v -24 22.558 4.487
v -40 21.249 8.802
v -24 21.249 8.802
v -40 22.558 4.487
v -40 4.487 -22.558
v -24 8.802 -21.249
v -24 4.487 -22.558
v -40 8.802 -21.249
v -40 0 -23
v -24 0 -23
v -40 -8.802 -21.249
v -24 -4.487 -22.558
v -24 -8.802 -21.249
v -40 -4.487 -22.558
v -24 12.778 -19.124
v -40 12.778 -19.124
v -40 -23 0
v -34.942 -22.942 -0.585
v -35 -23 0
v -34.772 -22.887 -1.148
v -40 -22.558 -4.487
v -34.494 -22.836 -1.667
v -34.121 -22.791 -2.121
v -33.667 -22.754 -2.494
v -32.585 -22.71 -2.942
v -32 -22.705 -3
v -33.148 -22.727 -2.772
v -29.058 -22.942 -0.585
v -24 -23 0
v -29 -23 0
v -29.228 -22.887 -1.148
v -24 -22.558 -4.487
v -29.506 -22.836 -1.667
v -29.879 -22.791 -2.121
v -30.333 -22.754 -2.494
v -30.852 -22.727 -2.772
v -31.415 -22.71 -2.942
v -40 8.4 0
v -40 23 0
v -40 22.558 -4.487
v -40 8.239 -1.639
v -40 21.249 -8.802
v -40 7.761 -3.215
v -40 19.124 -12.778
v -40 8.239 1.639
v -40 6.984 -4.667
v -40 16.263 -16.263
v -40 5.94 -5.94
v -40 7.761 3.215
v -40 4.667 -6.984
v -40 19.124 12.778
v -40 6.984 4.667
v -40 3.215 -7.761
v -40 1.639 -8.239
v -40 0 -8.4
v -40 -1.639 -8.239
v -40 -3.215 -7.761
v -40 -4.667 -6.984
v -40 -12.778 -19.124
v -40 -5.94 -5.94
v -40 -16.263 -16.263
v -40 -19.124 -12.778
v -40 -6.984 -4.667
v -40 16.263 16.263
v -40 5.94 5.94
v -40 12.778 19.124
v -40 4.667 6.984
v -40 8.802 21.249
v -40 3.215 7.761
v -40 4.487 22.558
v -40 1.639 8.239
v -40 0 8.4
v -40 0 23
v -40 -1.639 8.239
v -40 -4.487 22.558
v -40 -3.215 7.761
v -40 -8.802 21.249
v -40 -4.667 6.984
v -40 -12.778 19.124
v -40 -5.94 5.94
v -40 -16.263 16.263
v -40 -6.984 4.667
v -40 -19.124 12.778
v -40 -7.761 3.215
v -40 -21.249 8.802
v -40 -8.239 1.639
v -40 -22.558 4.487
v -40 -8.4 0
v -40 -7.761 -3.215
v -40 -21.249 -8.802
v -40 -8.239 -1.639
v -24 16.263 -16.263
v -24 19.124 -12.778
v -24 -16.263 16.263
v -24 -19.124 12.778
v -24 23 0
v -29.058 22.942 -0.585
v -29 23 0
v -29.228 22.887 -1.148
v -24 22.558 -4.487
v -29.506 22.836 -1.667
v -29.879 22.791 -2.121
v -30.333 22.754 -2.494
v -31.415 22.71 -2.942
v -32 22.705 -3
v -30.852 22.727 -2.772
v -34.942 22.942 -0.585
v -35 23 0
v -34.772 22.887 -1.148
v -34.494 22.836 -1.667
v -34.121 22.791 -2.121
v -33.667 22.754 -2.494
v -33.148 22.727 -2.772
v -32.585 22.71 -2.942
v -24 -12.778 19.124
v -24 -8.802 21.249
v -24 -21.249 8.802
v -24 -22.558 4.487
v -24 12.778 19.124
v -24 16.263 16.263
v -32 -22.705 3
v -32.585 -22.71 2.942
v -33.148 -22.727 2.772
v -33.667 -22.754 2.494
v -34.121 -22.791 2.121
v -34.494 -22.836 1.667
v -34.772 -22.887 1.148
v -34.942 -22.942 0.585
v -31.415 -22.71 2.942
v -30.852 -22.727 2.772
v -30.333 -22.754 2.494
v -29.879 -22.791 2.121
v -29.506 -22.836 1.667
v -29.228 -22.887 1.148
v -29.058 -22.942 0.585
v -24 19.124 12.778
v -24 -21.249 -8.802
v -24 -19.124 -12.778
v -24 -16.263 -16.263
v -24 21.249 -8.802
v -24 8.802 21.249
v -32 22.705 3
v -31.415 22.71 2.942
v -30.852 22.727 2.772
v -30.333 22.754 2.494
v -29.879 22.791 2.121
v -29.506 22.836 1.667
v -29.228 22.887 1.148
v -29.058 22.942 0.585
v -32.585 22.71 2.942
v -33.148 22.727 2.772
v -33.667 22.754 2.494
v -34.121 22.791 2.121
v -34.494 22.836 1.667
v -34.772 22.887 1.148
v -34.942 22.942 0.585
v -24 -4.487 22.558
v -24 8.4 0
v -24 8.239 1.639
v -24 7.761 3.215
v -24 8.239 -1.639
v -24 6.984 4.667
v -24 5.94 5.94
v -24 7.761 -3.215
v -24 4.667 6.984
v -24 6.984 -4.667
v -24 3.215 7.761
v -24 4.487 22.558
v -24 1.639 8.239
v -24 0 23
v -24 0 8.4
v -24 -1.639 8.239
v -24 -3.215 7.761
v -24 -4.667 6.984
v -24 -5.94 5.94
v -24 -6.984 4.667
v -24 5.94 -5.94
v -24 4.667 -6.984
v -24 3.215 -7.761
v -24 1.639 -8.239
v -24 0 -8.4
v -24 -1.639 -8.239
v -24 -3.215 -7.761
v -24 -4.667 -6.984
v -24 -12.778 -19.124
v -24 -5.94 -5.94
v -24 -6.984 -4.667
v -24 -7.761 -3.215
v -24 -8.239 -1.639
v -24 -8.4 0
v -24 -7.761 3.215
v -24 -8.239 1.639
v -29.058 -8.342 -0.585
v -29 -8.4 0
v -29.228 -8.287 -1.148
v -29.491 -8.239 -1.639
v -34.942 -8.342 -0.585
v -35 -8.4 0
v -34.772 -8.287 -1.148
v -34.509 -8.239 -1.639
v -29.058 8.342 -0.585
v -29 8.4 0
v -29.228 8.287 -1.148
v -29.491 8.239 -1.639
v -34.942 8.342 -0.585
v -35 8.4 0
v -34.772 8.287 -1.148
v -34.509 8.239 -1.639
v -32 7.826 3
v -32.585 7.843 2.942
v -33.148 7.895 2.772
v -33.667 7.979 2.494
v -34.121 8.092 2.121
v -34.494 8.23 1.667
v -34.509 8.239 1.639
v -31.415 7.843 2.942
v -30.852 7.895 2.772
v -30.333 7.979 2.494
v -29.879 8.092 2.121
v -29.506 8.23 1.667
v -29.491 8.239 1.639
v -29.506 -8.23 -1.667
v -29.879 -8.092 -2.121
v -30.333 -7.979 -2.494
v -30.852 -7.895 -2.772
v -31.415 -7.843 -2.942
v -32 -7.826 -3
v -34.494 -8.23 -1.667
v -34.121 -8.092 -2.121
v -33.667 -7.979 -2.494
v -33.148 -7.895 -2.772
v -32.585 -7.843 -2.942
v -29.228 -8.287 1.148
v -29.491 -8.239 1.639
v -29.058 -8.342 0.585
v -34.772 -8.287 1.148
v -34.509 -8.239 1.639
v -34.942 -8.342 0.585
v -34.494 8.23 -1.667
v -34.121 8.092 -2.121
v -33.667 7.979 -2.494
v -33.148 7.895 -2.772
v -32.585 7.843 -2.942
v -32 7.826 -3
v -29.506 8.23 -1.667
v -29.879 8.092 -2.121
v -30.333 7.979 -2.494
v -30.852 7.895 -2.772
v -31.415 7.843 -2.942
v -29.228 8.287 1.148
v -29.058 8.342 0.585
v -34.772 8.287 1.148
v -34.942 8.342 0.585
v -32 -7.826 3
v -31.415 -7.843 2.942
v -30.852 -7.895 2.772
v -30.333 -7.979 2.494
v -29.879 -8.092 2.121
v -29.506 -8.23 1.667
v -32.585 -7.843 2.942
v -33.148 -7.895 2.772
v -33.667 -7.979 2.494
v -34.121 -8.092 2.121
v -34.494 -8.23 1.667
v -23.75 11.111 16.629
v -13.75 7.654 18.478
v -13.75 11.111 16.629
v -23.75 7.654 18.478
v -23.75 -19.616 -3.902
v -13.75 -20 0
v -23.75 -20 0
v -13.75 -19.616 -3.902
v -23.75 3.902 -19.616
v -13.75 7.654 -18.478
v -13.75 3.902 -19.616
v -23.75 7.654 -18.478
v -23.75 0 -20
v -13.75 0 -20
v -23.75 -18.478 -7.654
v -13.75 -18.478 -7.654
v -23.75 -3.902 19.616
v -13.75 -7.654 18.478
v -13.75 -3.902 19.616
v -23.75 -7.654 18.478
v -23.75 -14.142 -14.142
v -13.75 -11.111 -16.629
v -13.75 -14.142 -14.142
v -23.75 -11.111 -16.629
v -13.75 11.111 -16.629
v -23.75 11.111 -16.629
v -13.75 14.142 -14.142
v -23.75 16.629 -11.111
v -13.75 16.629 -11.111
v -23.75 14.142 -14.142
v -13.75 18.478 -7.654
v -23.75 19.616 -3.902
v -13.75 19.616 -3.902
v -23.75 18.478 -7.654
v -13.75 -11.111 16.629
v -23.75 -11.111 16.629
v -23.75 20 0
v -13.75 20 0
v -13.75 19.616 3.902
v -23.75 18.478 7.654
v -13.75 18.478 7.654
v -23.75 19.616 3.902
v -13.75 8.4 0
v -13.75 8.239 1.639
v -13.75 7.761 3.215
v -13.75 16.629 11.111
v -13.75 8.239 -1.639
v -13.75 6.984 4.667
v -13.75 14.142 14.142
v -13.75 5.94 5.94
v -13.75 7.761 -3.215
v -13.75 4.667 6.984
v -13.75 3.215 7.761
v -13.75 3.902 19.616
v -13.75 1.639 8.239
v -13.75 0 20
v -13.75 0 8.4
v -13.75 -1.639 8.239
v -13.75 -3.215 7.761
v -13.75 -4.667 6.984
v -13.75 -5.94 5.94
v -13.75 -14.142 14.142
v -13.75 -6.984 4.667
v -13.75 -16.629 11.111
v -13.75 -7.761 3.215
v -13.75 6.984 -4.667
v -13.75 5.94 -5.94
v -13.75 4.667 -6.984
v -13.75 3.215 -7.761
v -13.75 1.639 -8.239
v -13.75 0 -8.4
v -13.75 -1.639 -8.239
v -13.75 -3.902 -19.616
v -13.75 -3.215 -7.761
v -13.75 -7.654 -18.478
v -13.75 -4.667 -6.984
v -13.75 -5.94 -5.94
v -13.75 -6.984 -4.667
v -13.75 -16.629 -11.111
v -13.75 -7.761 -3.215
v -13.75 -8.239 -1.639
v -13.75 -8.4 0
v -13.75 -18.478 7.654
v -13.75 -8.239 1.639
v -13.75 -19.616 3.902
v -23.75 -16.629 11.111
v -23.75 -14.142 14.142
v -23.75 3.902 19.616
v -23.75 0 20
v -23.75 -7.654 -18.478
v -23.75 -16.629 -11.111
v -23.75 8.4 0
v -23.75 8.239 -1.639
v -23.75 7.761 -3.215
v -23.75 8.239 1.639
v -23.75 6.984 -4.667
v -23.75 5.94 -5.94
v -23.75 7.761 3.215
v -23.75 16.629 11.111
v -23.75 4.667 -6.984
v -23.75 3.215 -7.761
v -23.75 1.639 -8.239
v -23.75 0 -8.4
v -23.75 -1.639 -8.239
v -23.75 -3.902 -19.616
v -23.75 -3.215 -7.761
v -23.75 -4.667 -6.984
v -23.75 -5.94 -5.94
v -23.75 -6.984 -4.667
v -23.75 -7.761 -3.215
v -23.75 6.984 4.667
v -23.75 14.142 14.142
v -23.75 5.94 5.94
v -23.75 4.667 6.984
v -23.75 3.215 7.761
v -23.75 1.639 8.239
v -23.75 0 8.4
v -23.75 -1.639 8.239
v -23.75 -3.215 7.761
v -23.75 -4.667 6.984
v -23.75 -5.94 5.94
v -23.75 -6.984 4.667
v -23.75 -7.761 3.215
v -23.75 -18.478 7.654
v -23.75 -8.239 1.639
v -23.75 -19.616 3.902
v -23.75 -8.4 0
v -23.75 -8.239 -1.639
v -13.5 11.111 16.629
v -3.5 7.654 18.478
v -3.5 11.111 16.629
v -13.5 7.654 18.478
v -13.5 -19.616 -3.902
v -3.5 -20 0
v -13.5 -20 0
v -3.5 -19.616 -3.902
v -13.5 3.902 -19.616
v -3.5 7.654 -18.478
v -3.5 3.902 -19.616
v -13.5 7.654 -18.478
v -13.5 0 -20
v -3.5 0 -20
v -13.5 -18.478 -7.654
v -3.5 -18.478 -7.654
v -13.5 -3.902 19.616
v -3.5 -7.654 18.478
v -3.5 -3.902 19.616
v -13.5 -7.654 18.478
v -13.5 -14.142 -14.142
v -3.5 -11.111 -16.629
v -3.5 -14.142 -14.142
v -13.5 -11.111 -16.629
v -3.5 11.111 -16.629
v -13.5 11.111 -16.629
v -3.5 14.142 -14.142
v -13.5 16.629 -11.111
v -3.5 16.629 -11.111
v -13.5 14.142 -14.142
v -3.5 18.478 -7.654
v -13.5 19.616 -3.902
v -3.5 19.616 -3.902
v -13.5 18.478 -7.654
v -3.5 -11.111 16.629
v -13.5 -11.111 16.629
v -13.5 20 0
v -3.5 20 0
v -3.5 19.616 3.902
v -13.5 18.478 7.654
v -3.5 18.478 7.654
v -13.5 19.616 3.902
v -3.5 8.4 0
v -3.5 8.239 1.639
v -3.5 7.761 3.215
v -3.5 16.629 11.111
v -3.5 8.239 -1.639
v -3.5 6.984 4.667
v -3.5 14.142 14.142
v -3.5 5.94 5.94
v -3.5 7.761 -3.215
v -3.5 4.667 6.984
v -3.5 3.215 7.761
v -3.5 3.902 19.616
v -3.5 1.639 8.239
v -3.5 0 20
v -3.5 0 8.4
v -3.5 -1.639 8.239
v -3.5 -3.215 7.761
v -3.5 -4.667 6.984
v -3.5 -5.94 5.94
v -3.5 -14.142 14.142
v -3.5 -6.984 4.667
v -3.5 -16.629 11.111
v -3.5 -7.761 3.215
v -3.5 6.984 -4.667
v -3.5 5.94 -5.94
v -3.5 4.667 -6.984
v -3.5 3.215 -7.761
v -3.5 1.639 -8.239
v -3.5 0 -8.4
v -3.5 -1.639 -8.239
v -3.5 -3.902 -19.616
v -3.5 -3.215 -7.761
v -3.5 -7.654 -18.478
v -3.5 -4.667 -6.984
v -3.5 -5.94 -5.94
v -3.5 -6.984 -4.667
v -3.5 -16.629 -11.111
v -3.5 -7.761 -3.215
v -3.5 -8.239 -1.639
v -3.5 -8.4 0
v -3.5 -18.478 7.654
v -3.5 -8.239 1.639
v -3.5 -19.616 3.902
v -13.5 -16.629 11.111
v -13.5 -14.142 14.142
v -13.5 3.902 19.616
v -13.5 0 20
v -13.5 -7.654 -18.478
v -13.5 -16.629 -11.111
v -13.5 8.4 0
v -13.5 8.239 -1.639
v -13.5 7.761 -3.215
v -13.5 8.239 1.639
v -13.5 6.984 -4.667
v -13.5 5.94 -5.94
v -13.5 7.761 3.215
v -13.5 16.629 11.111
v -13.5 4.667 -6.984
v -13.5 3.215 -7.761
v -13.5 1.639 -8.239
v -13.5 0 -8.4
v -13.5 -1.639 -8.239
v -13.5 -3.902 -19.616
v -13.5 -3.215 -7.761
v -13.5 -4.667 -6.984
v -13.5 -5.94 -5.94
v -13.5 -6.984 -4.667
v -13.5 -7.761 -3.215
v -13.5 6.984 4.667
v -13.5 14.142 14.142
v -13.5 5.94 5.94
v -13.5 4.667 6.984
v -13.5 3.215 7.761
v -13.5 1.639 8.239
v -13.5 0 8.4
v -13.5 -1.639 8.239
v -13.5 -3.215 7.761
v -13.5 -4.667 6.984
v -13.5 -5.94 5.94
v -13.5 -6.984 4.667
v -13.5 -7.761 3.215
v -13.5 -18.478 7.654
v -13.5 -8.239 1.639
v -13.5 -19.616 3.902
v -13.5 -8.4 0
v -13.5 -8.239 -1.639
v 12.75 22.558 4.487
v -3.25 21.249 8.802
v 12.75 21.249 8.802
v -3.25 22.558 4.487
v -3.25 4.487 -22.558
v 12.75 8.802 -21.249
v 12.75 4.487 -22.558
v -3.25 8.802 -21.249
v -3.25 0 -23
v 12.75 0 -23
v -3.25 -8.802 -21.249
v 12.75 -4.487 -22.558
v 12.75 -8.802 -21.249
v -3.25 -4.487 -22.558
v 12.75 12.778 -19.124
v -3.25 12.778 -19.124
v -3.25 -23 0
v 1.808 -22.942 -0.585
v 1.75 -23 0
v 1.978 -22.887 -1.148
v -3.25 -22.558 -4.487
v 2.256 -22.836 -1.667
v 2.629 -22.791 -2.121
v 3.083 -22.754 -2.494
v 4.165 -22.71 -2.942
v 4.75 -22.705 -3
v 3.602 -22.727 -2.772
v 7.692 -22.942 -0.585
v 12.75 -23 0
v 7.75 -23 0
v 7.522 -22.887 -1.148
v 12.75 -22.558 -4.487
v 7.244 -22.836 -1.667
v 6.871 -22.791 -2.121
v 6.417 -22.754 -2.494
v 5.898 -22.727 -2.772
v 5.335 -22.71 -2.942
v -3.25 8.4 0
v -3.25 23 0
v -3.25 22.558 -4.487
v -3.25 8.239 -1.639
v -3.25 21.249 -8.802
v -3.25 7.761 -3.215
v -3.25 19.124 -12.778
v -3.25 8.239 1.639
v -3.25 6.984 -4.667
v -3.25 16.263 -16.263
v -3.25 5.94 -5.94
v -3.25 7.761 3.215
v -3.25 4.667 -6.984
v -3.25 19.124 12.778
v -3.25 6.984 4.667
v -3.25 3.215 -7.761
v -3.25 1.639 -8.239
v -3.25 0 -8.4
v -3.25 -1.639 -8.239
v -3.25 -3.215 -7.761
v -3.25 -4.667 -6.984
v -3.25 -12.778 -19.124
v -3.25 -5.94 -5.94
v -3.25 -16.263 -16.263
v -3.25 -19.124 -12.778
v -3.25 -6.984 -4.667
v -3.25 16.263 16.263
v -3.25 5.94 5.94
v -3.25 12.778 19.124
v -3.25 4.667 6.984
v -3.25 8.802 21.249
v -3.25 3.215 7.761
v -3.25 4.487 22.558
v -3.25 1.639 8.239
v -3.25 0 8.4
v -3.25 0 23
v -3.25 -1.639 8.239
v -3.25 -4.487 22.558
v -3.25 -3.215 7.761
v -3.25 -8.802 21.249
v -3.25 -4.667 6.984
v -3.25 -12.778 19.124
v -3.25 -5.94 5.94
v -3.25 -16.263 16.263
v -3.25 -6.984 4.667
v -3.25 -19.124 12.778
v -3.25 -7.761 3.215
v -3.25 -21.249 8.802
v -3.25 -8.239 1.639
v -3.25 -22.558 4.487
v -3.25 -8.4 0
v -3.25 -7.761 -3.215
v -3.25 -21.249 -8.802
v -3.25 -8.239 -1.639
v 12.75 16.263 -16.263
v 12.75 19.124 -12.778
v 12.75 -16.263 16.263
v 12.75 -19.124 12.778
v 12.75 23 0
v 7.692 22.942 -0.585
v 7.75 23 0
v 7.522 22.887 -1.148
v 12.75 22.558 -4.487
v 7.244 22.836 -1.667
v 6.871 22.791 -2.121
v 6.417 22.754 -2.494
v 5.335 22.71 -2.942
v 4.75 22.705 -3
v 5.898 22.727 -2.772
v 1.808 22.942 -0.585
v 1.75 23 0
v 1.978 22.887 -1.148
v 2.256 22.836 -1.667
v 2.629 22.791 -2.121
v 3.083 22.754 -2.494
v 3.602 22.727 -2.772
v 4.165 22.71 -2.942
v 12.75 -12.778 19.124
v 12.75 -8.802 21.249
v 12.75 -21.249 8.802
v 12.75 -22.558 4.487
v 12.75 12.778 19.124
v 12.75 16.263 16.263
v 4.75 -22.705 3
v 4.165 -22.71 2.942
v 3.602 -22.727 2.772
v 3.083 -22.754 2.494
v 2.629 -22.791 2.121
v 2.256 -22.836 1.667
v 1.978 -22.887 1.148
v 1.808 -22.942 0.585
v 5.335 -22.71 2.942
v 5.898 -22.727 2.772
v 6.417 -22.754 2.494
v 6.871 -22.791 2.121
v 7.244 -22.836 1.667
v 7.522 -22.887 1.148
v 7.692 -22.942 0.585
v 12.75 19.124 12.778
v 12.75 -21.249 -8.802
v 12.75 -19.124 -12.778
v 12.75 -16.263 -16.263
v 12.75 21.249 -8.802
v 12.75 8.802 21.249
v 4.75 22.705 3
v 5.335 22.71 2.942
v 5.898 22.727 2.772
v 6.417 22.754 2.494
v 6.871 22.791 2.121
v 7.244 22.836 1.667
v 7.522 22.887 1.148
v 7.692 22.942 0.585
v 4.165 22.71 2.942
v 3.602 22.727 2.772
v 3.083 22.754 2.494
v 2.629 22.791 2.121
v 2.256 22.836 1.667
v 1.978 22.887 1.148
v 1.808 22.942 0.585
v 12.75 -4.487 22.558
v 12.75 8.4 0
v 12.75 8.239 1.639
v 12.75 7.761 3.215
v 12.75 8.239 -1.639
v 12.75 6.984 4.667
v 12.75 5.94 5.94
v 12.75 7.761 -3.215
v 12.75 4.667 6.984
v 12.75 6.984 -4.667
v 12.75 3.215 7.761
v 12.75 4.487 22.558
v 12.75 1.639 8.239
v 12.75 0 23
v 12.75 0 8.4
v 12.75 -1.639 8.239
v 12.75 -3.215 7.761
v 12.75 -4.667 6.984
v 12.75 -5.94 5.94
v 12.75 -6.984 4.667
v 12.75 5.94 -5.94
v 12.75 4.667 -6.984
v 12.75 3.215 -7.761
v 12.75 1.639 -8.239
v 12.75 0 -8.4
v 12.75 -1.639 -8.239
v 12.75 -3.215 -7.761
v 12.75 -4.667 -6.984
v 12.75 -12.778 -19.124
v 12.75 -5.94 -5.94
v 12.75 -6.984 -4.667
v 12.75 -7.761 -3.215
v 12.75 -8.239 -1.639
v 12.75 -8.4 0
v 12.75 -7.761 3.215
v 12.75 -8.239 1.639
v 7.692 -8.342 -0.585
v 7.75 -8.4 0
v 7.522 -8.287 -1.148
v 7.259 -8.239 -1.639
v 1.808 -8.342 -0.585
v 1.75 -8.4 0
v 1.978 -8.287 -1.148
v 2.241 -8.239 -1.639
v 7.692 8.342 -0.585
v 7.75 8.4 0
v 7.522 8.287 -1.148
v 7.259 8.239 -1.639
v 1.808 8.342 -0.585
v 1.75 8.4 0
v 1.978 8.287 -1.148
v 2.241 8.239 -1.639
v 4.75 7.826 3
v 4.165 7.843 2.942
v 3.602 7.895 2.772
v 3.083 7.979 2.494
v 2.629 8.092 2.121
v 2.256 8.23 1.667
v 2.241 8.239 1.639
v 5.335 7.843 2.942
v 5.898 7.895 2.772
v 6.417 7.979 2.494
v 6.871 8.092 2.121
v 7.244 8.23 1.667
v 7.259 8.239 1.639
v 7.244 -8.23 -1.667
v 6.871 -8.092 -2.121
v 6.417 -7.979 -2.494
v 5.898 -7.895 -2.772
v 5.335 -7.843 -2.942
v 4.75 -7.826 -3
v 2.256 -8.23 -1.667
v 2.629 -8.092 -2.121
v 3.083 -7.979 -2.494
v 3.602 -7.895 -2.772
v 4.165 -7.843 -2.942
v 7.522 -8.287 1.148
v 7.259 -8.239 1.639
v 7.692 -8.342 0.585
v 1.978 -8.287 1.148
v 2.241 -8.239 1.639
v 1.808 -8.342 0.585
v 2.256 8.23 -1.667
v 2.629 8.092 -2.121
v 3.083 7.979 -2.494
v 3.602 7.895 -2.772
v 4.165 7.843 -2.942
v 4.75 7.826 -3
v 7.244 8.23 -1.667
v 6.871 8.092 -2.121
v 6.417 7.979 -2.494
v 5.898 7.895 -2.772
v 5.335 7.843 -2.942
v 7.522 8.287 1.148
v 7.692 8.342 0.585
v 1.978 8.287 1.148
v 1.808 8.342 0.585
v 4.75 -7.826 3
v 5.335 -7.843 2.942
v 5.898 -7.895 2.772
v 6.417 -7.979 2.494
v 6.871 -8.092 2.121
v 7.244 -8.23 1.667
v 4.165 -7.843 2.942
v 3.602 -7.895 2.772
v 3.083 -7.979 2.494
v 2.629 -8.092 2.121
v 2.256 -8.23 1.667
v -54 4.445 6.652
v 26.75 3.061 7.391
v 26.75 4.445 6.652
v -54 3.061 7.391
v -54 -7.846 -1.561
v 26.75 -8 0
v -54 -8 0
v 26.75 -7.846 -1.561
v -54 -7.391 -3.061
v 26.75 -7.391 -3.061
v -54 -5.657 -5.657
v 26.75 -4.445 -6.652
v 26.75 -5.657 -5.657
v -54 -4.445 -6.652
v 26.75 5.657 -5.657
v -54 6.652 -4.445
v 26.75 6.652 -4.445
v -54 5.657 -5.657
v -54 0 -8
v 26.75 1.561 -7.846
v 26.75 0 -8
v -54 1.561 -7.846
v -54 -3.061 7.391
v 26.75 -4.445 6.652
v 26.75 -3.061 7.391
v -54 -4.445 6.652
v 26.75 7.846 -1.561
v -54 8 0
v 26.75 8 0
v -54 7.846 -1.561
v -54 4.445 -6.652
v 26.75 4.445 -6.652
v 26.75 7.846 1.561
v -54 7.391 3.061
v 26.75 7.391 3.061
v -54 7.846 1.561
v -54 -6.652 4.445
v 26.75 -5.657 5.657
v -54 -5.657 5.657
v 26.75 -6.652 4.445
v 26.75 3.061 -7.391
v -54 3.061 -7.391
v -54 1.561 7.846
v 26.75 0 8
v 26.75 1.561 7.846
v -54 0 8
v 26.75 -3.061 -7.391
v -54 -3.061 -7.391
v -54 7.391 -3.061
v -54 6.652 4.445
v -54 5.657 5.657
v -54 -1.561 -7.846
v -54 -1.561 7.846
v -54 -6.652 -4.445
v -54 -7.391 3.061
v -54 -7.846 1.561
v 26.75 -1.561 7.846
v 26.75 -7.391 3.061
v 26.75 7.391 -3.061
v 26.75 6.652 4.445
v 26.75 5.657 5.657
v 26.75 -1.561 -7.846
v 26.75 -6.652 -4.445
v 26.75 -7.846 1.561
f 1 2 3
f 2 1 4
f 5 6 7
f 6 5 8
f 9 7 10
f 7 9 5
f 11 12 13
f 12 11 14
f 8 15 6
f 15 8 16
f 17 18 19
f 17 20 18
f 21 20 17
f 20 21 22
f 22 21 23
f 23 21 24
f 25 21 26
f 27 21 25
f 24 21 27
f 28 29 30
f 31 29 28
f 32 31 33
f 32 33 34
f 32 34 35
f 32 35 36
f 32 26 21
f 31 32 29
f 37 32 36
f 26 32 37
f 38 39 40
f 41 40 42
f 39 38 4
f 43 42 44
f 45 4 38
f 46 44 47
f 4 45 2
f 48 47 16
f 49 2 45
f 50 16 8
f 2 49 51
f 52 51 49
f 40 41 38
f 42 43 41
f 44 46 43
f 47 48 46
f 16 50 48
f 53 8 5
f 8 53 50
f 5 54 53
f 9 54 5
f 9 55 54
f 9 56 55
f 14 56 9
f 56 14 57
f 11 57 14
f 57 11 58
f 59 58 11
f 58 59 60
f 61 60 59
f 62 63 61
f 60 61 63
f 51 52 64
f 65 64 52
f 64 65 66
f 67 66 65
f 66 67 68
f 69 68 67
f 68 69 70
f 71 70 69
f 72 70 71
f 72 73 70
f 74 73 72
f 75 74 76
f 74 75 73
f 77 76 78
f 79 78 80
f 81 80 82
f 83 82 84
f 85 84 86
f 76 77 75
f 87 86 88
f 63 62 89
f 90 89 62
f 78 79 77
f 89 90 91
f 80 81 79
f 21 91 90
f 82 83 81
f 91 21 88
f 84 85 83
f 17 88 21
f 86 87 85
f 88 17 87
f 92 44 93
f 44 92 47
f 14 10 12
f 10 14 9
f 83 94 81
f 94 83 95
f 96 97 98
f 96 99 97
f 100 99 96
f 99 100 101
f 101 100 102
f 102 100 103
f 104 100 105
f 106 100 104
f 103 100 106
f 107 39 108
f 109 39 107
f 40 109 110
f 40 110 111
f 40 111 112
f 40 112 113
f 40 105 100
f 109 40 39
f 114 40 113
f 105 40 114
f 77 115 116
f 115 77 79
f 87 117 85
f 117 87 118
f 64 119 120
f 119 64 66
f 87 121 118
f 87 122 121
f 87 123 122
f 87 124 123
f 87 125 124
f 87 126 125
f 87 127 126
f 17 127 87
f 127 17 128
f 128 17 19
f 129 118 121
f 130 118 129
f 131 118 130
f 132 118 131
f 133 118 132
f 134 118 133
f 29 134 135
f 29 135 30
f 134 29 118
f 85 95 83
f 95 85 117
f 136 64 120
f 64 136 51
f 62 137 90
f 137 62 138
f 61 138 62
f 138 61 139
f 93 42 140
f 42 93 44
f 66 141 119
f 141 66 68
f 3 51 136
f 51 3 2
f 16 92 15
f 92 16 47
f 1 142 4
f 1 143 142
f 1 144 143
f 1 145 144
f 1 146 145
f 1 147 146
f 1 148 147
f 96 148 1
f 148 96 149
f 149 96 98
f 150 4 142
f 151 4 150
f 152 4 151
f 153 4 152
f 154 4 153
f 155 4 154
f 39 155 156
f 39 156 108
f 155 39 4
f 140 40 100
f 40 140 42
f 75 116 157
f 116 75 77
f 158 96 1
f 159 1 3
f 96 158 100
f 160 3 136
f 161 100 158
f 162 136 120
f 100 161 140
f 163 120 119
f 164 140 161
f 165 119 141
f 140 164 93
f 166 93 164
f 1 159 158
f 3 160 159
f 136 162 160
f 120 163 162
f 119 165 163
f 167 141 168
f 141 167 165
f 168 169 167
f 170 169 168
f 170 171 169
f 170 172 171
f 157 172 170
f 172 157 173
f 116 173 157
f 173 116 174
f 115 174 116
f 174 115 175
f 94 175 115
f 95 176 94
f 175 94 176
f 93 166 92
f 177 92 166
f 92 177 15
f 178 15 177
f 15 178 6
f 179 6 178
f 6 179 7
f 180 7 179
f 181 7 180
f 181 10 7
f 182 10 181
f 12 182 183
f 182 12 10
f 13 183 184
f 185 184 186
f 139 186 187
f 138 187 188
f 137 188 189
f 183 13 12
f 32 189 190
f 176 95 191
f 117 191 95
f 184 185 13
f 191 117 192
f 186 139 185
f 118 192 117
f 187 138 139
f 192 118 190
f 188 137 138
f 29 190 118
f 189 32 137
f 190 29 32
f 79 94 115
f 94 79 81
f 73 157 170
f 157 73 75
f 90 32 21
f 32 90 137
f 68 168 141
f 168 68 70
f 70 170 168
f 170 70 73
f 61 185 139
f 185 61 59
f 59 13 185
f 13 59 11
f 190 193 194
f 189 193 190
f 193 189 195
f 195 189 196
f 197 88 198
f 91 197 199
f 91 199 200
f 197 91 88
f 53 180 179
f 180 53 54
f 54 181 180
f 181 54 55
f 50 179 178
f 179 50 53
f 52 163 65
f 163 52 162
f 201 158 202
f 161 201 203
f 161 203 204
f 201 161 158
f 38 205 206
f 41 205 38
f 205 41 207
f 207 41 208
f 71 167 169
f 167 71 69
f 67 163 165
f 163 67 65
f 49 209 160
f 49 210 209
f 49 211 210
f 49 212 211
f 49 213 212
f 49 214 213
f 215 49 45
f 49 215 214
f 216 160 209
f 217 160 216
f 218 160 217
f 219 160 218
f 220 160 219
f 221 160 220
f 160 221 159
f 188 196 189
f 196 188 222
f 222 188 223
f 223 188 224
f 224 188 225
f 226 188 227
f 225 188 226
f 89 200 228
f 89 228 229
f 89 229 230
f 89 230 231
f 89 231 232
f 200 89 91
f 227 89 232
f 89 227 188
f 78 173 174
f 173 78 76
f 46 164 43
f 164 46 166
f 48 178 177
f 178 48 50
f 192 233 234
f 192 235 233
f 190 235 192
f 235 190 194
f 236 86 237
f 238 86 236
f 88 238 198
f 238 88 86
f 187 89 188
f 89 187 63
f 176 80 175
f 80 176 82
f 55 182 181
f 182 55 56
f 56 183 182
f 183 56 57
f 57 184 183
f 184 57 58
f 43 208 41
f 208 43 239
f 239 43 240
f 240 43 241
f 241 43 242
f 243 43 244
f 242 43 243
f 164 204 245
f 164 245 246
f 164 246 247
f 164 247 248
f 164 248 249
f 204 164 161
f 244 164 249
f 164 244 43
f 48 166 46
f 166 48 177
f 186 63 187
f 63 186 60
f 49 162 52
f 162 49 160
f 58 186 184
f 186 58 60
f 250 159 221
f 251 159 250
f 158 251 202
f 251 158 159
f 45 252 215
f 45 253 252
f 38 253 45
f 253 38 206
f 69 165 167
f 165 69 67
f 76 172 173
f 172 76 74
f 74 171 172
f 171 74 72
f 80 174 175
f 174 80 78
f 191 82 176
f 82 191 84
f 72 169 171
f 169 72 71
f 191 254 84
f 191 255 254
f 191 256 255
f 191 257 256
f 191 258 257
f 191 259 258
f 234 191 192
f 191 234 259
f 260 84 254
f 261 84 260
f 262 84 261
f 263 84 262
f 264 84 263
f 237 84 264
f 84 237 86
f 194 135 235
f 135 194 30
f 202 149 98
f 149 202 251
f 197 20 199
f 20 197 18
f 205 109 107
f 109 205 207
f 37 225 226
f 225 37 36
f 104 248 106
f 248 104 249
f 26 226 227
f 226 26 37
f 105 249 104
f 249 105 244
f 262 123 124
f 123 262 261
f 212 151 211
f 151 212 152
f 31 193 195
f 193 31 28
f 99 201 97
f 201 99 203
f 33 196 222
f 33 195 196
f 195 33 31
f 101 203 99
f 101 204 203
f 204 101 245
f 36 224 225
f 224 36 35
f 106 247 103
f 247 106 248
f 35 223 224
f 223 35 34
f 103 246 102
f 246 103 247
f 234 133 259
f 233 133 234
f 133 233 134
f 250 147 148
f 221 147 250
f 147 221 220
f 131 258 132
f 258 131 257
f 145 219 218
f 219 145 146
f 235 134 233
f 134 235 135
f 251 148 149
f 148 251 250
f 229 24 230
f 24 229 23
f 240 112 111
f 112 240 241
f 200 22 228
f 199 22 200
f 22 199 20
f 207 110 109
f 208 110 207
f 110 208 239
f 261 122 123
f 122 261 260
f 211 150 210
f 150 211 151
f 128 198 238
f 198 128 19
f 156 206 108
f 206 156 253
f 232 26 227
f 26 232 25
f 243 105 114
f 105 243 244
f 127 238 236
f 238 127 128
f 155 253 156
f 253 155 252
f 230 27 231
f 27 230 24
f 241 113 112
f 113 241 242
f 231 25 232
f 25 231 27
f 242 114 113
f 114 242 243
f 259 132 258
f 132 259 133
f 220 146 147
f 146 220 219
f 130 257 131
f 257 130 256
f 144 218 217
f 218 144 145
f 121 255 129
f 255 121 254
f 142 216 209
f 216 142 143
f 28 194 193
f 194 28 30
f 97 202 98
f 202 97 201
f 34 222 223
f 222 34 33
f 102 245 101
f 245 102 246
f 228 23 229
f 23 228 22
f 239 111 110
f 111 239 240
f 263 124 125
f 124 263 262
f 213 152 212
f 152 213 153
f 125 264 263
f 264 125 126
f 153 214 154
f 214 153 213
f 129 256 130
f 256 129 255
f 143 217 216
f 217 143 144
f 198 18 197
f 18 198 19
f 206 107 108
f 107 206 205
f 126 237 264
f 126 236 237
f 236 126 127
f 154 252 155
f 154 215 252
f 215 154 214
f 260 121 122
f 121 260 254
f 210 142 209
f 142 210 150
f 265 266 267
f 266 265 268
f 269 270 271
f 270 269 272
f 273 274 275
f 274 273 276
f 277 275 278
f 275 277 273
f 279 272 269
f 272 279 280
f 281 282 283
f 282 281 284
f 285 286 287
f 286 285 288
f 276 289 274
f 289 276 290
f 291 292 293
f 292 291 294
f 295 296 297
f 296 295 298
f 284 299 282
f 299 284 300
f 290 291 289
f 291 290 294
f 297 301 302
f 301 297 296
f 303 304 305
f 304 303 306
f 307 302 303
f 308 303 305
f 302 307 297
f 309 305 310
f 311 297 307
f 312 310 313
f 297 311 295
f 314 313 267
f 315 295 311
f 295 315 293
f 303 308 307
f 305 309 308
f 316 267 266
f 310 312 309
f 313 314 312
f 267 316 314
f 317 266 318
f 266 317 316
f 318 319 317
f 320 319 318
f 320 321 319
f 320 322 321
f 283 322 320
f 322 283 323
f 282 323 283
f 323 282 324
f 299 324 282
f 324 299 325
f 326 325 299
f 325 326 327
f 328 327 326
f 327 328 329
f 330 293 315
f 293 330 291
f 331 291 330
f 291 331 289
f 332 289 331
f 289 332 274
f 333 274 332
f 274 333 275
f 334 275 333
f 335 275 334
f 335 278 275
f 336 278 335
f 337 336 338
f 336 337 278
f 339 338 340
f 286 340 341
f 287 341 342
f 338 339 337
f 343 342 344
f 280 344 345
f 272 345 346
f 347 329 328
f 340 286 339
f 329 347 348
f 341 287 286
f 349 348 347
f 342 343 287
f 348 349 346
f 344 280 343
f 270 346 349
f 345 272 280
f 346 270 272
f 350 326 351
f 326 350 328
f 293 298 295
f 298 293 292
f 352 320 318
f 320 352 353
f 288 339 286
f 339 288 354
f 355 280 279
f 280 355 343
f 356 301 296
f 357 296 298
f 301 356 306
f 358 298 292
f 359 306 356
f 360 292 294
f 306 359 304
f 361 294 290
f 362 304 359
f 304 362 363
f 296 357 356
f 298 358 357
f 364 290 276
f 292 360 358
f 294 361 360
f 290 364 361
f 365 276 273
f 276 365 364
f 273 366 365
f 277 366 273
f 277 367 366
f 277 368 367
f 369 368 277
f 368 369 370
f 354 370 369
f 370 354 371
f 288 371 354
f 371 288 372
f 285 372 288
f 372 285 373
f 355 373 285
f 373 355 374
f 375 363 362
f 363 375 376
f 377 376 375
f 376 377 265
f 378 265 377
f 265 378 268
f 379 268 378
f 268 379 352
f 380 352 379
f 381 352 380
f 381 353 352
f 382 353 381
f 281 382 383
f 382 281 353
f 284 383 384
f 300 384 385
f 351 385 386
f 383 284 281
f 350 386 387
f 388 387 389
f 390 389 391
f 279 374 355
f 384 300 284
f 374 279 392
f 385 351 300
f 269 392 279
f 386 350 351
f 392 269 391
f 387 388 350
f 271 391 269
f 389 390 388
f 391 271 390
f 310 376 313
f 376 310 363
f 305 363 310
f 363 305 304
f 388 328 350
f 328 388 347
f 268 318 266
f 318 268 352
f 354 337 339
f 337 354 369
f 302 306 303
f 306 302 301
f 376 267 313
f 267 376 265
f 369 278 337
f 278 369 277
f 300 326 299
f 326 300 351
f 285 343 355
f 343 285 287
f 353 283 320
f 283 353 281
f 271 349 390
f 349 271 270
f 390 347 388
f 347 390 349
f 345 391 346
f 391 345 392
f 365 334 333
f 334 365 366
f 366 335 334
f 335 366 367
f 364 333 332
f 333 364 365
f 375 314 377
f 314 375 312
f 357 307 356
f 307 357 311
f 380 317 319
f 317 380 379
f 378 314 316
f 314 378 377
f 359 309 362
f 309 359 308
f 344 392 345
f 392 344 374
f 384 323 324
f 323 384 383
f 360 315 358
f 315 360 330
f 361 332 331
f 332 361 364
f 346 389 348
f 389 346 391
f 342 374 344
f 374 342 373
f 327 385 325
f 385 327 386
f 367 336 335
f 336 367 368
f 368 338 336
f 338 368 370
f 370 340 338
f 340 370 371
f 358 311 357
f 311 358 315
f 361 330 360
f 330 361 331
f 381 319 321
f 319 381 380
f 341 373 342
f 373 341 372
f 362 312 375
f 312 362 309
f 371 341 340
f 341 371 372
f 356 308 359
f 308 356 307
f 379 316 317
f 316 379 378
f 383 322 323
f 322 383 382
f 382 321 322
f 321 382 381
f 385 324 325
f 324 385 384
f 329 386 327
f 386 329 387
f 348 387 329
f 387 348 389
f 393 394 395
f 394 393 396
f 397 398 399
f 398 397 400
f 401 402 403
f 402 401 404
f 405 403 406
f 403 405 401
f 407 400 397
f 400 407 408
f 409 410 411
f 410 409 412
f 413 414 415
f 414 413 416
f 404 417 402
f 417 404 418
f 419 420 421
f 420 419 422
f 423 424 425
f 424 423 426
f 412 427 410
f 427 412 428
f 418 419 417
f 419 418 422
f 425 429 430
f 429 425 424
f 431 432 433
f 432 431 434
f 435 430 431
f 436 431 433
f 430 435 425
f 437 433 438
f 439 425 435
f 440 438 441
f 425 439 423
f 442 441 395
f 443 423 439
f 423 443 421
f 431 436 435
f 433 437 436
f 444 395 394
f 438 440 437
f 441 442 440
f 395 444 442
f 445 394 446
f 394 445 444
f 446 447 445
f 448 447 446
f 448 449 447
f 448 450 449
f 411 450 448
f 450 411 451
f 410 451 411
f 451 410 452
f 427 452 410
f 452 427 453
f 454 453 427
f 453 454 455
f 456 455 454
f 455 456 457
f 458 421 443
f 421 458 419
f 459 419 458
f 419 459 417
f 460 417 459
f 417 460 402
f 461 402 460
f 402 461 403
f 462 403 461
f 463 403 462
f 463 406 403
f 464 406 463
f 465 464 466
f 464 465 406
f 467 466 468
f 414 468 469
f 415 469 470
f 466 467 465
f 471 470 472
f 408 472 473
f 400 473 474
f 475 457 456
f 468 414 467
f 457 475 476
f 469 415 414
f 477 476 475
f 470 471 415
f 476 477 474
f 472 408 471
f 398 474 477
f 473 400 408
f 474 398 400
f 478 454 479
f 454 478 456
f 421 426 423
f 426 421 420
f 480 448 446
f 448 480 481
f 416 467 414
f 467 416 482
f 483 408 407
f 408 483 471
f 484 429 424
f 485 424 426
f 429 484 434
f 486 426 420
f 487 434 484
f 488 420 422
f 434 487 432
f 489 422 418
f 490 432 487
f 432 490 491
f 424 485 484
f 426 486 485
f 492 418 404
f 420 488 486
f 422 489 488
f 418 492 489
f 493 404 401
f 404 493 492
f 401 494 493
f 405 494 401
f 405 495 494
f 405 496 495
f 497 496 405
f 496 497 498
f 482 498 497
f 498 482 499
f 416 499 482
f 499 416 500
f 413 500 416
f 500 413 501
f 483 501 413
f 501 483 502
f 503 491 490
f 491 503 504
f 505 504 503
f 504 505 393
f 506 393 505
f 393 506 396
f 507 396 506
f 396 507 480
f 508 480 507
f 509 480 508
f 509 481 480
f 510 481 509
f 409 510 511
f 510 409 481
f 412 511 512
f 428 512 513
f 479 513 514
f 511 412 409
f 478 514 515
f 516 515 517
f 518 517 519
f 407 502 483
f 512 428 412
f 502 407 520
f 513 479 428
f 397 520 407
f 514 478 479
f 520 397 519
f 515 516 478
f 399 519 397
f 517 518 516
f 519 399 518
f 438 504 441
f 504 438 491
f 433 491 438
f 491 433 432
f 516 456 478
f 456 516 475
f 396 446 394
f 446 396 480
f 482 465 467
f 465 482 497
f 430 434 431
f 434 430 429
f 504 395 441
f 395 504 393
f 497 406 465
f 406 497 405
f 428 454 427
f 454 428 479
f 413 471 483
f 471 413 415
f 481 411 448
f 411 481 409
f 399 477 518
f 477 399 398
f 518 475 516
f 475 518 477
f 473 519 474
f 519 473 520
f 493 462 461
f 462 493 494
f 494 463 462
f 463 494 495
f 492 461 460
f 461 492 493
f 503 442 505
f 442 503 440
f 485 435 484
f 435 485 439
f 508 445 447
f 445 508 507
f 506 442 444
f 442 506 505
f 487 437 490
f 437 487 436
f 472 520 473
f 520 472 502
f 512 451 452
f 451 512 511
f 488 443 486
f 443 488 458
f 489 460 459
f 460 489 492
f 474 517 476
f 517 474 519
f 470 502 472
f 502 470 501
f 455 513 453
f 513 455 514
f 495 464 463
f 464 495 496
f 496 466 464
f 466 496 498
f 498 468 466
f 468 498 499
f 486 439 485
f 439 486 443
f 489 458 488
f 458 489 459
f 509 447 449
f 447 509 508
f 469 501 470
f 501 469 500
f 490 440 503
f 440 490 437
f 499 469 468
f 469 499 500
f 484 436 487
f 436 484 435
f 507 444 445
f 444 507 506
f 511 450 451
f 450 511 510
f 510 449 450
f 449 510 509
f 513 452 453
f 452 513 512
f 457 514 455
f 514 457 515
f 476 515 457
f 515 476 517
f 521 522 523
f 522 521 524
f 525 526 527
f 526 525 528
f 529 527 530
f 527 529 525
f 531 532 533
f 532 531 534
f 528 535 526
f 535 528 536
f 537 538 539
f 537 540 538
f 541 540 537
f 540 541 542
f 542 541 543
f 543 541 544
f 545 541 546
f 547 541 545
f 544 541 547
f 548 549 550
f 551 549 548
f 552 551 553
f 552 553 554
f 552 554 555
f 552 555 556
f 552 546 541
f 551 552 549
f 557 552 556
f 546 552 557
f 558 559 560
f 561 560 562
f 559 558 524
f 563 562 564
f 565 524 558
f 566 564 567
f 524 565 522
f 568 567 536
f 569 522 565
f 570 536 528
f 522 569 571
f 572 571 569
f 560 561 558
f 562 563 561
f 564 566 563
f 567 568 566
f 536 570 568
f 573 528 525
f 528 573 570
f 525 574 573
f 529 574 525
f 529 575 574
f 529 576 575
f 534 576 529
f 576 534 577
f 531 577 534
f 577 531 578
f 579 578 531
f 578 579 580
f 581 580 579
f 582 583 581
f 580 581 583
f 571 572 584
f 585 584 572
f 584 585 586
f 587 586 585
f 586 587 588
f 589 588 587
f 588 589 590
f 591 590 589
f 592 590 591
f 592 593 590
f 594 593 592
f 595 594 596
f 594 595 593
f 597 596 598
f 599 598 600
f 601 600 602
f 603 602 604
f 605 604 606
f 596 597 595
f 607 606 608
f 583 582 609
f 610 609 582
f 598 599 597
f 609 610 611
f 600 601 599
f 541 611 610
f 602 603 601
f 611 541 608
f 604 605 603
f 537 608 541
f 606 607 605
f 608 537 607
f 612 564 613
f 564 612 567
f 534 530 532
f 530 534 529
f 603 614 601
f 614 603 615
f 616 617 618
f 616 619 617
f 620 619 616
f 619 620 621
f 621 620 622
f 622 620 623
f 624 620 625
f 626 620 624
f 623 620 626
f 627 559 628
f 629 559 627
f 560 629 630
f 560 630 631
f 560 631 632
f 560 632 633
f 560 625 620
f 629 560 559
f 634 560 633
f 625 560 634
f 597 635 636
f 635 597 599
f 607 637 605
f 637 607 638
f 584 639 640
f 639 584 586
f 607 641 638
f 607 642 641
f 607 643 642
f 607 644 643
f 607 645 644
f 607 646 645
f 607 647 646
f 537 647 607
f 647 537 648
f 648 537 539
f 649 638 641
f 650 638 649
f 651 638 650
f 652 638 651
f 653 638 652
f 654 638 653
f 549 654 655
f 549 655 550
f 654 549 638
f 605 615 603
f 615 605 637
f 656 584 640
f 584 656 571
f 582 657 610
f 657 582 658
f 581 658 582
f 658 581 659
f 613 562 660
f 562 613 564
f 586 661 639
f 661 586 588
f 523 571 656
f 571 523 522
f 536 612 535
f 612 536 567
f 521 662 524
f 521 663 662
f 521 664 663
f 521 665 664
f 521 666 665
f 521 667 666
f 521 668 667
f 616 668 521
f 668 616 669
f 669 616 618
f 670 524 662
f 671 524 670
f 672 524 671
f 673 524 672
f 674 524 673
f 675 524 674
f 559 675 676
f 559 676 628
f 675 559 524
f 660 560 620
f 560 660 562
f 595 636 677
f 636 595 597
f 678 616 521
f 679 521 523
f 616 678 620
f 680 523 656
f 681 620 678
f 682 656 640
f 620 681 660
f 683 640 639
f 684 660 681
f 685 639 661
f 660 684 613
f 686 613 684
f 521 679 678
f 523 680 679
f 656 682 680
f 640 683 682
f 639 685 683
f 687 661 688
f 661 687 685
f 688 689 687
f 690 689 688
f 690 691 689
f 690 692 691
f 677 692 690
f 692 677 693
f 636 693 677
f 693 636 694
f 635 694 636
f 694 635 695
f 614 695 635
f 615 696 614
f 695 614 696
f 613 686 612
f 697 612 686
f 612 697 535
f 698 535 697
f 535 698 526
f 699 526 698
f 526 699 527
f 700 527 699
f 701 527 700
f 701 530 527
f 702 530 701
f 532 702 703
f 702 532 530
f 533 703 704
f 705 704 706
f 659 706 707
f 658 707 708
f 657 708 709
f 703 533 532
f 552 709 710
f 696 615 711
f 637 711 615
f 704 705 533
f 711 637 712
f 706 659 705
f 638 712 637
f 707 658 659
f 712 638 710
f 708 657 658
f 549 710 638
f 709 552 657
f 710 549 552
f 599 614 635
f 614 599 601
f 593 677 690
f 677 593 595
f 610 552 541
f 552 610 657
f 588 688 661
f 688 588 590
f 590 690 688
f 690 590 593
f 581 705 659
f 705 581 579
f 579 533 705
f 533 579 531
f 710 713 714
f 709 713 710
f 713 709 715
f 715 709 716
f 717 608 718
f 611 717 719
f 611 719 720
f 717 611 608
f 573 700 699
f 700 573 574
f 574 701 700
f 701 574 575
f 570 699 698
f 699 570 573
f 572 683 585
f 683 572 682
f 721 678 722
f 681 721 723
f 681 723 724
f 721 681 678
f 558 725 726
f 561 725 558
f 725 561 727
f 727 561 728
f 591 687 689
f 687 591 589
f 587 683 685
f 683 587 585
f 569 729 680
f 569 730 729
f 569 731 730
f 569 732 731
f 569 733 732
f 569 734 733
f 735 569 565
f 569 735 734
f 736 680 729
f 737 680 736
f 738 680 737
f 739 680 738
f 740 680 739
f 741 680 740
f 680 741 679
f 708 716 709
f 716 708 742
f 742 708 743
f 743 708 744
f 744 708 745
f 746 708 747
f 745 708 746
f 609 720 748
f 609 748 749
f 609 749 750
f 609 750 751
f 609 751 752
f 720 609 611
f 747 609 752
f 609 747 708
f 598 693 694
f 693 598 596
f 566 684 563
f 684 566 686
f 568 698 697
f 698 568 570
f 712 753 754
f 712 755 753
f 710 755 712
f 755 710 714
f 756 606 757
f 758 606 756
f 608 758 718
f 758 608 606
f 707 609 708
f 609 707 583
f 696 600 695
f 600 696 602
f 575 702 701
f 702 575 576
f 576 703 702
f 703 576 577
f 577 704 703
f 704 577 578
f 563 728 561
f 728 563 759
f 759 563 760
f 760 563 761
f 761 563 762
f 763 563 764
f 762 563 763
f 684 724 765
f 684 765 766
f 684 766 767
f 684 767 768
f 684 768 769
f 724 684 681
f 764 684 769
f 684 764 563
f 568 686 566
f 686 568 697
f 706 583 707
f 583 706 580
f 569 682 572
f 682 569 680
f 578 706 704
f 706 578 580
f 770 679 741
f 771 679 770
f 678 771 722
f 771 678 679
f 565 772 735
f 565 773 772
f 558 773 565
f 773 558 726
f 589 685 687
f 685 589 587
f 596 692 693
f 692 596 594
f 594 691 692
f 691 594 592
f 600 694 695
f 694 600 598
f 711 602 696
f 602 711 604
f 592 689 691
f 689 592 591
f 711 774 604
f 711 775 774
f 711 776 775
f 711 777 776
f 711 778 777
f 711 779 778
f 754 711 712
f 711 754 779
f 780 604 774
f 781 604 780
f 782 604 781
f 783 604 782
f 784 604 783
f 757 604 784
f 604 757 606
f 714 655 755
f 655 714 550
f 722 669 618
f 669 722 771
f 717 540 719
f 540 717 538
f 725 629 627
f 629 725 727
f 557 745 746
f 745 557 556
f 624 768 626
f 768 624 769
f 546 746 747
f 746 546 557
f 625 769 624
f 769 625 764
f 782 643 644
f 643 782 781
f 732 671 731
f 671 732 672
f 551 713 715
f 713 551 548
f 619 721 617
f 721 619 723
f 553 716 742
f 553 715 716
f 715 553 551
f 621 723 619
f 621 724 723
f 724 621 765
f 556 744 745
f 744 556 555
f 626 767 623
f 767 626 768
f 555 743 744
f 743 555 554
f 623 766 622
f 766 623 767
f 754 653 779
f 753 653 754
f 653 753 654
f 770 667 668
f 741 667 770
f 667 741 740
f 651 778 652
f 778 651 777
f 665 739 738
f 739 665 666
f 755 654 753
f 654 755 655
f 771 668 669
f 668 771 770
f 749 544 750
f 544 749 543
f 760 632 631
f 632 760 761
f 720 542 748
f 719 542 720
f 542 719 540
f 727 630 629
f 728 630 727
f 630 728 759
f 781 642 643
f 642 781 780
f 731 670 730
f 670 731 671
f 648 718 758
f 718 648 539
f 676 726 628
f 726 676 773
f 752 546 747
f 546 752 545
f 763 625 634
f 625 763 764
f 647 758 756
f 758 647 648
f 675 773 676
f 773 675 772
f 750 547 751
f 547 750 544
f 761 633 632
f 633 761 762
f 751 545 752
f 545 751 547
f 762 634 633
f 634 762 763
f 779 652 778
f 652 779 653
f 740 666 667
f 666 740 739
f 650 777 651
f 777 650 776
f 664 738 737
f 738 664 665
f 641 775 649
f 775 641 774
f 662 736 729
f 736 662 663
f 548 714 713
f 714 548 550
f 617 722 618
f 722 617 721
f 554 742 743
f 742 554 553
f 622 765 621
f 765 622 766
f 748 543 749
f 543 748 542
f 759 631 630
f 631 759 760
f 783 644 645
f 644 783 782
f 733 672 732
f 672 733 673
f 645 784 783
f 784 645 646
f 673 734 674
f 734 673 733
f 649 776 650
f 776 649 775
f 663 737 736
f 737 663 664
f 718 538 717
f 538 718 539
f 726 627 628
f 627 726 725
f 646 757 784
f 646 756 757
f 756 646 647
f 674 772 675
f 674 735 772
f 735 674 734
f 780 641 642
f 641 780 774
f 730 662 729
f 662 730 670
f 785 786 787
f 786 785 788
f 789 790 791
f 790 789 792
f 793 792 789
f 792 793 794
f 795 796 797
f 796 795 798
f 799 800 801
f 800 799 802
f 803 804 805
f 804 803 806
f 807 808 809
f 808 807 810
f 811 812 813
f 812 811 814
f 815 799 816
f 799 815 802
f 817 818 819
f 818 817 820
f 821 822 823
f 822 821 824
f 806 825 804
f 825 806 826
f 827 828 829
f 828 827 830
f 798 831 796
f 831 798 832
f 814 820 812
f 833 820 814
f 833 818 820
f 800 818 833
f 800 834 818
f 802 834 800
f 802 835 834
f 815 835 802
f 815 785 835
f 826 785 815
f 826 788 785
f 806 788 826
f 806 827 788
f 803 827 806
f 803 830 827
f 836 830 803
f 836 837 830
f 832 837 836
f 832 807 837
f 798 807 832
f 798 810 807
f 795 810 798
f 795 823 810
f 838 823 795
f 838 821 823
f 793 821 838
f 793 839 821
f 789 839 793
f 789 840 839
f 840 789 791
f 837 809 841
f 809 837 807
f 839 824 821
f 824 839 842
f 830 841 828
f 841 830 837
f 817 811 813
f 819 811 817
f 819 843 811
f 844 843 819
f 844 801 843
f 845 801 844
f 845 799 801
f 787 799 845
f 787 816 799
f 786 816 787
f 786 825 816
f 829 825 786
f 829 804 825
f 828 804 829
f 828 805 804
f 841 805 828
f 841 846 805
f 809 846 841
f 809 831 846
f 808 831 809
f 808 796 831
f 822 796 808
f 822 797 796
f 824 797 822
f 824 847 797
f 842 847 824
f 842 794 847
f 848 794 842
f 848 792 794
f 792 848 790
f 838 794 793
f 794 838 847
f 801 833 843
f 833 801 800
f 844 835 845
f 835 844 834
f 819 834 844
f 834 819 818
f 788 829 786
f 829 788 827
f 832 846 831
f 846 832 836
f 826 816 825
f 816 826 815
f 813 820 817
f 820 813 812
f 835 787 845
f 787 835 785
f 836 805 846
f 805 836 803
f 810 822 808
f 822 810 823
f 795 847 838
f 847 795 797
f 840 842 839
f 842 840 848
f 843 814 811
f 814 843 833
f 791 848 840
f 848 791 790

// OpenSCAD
$fn = 32;

// ------------------------------------------------------------------------
// Shaft with rings and collars: d16 shaft, 4 rings
// Every part is its own module, assembly() places them once.
// ------------------------------------------------------------------------

// --- part 1 ---
module shaft() {
  translate([0, 0, -40.375]) cylinder(h = 80.75, d = 16);
}

// --- part 2 ---
module collar_a() {
  difference() {
    cylinder(h = 16, d = 46);
    translate([0, 0, -1]) cylinder(h = 18, d = 16.8);
    translate([0, 0, 8]) rotate([90, 0, 0]) cylinder(h = 48, d = 6, center = true);
  }
}

// --- part 3 ---
module spacer_a() {
  difference() {
      translate([0, 0, 0]) cylinder(h = 10, d = 40);
      translate([0, 0, -1]) cylinder(h = 12, d = 16.8);
    }
}

// --- part 4 ---
module spacer_b() {
  difference() {
      translate([0, 0, 0]) cylinder(h = 10, d = 40);
      translate([0, 0, -1]) cylinder(h = 12, d = 16.8);
    }
}

// --- part 5 ---
module collar_b() {
  difference() {
    cylinder(h = 16, d = 46);
    translate([0, 0, -1]) cylinder(h = 18, d = 16.8);
    translate([0, 0, 8]) rotate([90, 0, 0]) cylinder(h = 48, d = 6, center = true);
  }
}

// --- assembly ---
module assembly() {
  translate([-13.625, 0, 0]) rotate([0, 90, 0]) shaft();
  translate([-40, 0, 0]) rotate([0, 90, 0]) collar_a();
  translate([-23.75, 0, 0]) rotate([0, 90, 0]) spacer_a();
  translate([-13.5, 0, 0]) rotate([0, 90, 0]) spacer_b();
  translate([-3.25, 0, 0]) rotate([0, 90, 0]) collar_b();
}

assembly();
